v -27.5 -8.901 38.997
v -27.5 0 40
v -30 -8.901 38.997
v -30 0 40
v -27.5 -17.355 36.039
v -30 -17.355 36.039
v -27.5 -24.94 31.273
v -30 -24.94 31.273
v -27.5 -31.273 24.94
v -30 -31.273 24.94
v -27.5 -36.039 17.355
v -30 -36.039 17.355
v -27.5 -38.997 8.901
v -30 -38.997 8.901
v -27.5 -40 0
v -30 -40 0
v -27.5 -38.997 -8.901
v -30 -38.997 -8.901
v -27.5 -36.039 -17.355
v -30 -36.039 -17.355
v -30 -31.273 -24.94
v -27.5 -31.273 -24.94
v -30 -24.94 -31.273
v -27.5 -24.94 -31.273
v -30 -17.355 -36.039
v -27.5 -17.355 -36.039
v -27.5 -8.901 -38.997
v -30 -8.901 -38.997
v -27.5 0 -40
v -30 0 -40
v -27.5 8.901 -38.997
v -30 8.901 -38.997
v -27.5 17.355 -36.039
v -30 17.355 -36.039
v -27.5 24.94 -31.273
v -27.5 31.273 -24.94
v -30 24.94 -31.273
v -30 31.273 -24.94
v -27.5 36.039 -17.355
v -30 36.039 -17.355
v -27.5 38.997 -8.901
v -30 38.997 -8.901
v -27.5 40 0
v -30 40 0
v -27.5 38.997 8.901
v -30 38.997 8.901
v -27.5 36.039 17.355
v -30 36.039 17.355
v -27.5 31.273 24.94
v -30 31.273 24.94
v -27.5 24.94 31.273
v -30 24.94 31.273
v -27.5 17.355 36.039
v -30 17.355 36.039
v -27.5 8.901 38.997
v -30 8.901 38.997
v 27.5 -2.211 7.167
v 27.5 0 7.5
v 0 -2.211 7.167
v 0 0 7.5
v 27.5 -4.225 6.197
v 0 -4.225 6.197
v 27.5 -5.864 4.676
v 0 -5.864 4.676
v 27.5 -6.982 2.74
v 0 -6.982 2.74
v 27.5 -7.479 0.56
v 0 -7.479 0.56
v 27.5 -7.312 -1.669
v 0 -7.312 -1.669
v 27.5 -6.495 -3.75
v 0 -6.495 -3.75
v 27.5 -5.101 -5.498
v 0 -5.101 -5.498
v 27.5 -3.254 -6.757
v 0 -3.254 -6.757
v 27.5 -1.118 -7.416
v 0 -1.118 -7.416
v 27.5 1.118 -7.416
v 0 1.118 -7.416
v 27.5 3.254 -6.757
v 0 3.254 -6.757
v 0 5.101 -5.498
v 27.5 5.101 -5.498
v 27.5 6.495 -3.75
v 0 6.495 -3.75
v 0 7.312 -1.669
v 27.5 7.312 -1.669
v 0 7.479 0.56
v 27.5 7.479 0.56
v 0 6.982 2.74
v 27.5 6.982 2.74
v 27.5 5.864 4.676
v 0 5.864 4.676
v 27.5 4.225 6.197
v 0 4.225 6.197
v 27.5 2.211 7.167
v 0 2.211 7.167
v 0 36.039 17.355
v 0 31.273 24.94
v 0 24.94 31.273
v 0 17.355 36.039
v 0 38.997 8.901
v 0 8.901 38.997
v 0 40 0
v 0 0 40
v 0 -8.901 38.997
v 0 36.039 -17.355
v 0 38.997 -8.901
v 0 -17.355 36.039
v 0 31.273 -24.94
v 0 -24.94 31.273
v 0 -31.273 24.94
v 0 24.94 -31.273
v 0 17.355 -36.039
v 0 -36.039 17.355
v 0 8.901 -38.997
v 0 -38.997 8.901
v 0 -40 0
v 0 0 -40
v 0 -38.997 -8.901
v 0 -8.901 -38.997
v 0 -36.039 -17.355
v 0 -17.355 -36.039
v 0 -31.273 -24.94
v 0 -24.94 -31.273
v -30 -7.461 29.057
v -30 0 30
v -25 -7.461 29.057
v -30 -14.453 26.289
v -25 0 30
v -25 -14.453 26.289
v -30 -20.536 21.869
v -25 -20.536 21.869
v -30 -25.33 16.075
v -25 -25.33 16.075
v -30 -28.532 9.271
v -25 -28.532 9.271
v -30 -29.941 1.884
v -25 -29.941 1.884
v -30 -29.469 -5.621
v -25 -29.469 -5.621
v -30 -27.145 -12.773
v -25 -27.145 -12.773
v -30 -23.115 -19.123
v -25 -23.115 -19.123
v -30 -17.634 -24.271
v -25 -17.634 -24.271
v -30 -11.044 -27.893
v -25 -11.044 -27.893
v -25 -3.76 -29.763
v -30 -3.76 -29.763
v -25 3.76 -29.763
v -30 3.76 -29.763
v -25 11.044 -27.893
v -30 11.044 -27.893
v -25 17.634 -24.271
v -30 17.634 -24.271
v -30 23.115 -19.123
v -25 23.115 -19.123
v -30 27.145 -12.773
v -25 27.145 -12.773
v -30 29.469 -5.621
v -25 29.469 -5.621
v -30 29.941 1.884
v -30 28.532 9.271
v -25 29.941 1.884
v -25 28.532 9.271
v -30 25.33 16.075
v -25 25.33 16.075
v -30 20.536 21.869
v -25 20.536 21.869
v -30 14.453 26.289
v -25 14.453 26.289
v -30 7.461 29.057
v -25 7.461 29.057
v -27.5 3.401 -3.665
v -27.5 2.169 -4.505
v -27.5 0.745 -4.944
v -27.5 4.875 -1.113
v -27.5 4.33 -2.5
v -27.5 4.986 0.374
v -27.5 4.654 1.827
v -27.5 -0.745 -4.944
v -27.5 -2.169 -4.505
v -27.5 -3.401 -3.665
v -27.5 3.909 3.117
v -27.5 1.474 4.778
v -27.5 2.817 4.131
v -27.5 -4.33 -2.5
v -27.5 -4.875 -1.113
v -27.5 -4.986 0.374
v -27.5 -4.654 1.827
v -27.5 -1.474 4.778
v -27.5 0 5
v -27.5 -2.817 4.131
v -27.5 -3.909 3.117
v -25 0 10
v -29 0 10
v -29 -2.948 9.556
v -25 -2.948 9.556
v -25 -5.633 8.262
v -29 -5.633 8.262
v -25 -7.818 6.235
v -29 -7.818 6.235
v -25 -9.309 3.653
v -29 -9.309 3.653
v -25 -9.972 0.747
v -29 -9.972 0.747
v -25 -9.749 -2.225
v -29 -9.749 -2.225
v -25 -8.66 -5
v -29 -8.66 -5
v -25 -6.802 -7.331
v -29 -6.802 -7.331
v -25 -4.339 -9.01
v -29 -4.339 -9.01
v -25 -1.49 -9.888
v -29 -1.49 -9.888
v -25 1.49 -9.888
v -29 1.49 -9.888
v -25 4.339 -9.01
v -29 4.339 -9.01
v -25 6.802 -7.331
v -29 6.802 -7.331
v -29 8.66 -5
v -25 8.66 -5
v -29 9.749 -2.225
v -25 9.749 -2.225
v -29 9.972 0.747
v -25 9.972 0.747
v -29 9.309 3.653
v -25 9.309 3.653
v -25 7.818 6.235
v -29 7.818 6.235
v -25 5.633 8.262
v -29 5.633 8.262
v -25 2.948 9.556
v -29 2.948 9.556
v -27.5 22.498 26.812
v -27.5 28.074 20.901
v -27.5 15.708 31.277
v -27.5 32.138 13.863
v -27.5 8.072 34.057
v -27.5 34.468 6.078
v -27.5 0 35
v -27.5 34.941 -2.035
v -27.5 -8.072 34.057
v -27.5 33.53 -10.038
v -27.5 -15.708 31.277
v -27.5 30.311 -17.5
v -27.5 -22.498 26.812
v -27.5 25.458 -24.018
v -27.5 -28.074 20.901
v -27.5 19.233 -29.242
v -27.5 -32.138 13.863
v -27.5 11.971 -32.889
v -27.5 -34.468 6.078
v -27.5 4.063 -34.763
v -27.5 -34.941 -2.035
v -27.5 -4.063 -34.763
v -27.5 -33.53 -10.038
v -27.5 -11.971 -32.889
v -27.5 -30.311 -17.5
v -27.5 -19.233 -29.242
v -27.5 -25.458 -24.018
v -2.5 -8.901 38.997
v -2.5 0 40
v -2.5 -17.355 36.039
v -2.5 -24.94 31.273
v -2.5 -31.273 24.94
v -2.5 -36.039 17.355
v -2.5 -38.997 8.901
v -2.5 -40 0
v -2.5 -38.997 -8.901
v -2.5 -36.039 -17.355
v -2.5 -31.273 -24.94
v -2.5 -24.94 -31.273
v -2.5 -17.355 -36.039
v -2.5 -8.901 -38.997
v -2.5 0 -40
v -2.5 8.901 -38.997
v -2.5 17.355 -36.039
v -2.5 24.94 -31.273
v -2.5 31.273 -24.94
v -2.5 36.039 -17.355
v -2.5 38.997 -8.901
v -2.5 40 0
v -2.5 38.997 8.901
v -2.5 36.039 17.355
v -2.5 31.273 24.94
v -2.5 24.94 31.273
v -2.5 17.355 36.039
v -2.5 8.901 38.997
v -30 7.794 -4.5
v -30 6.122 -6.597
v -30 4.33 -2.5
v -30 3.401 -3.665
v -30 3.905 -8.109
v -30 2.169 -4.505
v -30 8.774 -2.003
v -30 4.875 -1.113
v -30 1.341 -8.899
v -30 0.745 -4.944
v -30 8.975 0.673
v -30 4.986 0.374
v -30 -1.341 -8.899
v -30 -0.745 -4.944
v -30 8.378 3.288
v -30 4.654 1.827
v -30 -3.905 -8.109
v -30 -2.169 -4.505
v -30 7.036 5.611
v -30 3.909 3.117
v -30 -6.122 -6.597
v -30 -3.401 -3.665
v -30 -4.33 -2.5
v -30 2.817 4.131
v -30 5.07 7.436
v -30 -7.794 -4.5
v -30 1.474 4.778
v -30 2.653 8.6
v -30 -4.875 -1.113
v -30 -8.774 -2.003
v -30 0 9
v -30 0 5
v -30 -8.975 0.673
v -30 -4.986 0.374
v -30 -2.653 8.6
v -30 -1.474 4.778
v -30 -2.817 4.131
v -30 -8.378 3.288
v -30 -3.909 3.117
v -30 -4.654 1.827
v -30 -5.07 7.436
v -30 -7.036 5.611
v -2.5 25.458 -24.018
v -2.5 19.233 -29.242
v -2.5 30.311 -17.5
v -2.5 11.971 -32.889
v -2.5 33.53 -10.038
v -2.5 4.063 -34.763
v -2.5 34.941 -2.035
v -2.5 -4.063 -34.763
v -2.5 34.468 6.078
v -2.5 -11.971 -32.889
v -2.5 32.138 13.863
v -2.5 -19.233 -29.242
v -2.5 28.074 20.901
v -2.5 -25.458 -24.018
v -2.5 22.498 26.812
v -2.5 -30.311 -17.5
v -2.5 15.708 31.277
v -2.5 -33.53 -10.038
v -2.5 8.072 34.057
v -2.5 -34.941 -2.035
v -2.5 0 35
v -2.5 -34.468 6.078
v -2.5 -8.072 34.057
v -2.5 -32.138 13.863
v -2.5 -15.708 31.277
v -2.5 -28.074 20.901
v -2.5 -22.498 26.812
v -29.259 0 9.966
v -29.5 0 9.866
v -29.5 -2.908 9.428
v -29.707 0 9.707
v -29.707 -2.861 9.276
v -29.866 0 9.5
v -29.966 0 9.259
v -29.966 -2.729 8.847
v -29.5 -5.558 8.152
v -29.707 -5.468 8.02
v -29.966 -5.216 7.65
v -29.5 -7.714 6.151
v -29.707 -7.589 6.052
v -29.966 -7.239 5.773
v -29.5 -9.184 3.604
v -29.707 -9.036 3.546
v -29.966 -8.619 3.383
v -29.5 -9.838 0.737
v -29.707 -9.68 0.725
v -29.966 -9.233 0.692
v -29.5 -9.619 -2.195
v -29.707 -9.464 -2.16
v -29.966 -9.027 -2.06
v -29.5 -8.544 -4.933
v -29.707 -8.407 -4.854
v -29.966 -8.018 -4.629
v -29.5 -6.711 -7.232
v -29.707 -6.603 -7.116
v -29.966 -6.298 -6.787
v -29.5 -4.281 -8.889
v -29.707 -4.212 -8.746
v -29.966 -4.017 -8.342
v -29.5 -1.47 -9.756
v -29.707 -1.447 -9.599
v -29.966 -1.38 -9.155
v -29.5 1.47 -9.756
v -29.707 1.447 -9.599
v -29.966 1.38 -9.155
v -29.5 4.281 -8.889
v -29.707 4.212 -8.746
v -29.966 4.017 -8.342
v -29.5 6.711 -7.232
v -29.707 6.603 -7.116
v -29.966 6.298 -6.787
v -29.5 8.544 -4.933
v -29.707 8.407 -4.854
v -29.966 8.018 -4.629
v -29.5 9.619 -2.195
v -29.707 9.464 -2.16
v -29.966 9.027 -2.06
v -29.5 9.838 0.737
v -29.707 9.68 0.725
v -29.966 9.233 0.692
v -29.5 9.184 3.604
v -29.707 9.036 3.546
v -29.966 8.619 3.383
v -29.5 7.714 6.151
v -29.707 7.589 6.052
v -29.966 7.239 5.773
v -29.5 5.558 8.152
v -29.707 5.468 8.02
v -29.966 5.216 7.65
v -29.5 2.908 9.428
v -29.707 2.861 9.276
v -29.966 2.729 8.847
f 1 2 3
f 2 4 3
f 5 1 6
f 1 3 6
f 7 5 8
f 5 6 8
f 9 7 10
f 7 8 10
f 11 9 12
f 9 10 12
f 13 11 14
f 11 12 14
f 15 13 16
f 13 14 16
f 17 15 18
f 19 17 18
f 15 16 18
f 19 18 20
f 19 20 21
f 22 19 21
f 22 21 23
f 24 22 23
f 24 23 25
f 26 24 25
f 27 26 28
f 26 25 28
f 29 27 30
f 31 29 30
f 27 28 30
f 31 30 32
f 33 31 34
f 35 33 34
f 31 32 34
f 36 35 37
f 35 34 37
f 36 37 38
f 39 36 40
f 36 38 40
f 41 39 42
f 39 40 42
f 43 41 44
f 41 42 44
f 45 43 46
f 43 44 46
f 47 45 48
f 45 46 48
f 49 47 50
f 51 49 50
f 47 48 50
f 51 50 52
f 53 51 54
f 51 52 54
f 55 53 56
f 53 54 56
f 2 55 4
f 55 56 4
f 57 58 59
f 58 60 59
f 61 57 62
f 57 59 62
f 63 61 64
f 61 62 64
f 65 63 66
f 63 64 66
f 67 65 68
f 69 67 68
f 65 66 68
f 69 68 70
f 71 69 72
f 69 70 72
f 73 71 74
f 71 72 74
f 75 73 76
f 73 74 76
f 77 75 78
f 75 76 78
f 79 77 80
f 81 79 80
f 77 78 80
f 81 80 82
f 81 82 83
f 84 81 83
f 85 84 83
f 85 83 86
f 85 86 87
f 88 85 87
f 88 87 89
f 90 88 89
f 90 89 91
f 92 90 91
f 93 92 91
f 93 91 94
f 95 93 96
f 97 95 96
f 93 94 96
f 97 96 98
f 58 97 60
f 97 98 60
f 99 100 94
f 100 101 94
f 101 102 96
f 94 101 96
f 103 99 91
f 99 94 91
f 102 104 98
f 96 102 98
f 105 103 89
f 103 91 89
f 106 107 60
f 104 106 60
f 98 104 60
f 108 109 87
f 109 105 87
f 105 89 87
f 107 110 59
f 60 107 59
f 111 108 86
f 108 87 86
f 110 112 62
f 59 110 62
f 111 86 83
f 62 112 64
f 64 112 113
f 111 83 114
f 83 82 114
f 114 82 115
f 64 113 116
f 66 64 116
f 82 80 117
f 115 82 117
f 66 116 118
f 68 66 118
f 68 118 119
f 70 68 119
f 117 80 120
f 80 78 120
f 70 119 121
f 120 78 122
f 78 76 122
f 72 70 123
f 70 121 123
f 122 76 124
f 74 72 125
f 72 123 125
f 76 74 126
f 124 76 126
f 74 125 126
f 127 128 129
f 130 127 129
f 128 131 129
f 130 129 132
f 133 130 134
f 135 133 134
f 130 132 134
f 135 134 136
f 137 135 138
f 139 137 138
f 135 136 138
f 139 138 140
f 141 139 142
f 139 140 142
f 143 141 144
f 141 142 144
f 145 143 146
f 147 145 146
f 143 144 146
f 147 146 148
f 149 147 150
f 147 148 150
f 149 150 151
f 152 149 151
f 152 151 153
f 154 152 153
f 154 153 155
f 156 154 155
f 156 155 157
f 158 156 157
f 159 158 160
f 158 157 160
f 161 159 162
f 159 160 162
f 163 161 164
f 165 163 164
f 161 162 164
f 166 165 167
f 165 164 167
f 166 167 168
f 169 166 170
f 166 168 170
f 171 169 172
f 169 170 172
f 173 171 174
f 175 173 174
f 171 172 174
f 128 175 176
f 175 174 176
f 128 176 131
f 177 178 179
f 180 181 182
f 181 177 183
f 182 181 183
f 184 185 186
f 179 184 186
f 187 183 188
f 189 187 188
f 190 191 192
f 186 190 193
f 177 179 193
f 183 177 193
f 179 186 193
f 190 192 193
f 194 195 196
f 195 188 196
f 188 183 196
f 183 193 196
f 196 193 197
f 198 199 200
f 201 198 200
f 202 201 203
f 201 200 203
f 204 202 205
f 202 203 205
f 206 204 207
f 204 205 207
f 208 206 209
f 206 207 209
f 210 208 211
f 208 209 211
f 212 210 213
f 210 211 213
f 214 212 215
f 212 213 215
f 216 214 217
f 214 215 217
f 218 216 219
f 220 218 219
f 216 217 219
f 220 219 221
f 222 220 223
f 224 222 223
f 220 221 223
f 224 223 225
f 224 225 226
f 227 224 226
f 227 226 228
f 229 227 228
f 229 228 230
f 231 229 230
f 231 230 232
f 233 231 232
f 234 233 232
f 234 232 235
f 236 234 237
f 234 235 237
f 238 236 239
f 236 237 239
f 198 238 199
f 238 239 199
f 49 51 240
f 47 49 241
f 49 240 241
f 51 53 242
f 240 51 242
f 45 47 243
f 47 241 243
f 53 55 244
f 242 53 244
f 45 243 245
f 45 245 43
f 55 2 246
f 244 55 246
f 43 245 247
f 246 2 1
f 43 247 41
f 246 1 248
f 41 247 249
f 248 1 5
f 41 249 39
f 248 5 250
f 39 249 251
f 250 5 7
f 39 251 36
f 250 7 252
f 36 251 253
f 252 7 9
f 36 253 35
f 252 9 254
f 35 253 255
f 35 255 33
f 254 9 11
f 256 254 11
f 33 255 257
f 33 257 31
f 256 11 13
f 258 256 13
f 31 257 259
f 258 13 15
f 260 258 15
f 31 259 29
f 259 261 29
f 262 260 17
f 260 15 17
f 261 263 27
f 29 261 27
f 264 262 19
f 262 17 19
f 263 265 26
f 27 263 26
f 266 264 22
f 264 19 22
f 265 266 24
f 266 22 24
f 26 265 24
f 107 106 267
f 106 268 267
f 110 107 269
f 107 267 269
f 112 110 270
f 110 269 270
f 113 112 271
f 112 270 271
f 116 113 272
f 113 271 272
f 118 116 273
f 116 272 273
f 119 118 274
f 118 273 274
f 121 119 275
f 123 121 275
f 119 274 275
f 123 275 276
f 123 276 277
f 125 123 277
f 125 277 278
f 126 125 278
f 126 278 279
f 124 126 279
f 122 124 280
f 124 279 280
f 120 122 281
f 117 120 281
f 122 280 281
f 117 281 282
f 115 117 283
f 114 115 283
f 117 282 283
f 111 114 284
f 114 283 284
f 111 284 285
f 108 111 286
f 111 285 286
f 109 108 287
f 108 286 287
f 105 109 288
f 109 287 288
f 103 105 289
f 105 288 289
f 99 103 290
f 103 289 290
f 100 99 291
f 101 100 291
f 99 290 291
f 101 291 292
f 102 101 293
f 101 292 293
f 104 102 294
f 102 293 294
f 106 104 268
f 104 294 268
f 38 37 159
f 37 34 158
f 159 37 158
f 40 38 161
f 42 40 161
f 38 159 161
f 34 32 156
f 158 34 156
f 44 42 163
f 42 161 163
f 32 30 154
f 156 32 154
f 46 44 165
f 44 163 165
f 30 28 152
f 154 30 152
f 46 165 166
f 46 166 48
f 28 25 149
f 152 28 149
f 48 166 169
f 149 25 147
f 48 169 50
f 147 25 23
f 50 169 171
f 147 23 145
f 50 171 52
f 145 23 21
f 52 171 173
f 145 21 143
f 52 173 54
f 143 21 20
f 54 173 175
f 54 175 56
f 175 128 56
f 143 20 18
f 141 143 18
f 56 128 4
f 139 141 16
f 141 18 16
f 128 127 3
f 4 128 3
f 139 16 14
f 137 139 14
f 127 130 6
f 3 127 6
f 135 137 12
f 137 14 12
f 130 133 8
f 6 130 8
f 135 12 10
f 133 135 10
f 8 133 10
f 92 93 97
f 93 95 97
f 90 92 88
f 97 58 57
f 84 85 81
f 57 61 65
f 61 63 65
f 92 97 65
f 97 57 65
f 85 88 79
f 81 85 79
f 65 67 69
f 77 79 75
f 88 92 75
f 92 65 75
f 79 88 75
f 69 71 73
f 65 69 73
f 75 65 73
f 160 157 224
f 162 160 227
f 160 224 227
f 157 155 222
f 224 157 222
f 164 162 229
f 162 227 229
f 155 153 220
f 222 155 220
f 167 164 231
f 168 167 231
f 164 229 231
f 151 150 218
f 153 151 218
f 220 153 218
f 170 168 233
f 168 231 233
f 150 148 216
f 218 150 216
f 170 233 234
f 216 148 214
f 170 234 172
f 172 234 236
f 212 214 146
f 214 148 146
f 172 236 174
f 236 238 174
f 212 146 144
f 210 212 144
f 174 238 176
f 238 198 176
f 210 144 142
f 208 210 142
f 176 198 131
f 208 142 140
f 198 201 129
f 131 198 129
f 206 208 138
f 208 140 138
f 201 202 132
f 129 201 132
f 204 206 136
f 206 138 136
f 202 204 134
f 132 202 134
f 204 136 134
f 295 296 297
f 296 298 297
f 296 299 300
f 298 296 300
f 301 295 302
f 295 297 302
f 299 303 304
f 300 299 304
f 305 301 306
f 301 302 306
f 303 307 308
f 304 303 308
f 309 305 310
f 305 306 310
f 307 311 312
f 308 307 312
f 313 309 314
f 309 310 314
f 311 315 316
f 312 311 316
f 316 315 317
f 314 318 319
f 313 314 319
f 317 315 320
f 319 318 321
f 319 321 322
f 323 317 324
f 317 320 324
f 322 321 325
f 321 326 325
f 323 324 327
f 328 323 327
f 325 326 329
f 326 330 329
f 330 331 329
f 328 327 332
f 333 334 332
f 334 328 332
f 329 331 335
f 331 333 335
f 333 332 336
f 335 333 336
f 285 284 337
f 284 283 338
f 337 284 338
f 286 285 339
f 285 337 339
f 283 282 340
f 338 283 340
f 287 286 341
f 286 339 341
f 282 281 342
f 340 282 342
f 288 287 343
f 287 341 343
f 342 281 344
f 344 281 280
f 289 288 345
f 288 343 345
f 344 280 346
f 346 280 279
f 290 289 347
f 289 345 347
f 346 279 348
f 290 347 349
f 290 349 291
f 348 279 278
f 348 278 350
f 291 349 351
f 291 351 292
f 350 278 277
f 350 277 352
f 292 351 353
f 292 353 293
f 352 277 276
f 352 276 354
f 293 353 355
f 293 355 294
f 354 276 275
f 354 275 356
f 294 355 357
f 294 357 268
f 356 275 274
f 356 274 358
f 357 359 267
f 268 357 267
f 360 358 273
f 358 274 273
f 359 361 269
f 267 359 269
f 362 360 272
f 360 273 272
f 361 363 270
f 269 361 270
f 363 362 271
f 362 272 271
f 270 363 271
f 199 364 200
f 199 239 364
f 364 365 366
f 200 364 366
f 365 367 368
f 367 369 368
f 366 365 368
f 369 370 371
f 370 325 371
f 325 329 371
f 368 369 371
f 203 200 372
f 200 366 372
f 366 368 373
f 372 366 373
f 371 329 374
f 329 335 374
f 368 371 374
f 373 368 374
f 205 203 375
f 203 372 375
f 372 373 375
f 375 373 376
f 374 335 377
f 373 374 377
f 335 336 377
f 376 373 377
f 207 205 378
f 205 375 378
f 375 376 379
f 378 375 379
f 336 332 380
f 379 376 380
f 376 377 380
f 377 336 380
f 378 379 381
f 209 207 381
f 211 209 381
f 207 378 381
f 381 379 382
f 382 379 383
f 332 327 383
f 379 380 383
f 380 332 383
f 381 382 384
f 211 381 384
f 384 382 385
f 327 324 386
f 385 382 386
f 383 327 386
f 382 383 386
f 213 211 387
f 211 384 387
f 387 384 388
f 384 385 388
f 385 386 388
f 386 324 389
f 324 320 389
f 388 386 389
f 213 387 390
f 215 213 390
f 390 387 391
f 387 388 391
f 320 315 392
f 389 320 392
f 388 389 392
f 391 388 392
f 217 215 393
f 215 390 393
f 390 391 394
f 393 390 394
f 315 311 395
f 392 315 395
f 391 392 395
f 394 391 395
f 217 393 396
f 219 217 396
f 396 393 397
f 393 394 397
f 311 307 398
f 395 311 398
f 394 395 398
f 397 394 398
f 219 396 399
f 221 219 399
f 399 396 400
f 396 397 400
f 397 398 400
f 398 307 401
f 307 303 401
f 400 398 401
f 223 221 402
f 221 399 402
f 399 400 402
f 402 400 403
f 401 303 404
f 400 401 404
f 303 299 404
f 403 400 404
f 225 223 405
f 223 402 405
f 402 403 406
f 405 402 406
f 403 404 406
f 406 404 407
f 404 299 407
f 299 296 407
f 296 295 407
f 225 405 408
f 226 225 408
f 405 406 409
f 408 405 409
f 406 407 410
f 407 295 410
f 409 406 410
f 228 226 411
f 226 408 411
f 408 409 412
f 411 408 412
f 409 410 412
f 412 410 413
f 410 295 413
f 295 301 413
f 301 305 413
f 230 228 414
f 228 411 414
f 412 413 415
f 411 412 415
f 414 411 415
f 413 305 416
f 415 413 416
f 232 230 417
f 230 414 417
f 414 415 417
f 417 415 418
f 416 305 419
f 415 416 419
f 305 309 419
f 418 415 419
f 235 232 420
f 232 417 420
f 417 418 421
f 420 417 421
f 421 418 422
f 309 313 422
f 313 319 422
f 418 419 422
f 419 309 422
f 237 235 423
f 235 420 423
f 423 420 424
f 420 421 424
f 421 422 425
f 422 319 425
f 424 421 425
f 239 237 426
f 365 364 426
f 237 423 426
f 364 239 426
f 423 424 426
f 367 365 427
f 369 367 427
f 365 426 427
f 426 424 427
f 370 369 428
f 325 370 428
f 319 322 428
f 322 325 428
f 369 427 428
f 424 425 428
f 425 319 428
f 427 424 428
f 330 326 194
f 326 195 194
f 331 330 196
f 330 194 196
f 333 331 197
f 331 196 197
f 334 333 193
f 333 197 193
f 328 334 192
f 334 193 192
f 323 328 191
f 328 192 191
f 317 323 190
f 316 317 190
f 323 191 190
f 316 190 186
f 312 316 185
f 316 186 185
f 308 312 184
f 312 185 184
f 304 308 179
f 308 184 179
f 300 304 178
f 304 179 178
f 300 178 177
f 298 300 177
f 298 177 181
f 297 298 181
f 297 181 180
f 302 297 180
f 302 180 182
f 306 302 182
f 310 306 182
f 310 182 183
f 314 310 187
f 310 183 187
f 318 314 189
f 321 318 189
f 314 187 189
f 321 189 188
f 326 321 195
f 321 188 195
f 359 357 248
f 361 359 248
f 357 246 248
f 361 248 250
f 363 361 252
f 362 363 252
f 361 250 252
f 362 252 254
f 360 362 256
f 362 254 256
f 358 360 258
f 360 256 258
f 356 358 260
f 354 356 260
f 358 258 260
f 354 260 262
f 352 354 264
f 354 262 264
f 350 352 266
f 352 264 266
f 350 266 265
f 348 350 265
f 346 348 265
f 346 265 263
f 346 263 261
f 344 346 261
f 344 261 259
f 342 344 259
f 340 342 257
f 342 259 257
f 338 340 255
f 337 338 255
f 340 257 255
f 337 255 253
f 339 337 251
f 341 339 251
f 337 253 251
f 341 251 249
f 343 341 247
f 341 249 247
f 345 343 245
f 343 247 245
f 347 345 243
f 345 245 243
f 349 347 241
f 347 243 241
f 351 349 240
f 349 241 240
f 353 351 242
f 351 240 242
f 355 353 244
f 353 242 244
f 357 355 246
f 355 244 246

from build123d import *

# Parameters (mm, degrees)
FILLET1_R = 1


with BuildPart() as part:
    # Sketch1 → Revolve1 (revolve)
    with BuildSketch(Plane.XY, mode=Mode.PRIVATE) as revolve1_sk:
        Polygon((0, 7.5), (0, 40), (-2.5, 40), (-2.5, 35), (-27.5, 35), (-27.5, 40), (-30, 40), (-30, 30), (-25, 30), (-25, 10), (-30, 10), (-30, 5), (-27.5, 5), (-27.5, 0), (27.5, 0), (27.5, 7.5), align=None)
    revolve(revolve1_sk.sketch.rotate(Axis((-27.5, 0, 0), (1, 0, 0)), 90), axis=Axis((-27.5, 0, 0), (1, 0, 0)))

    # Fillet1
    fillet1_edges = [part.edges().sort_by_distance(p)[0] for p in [
        (-30, 0, -10),
    ]]
    fillet(fillet1_edges, radius=FILLET1_R)


solid = part.part
